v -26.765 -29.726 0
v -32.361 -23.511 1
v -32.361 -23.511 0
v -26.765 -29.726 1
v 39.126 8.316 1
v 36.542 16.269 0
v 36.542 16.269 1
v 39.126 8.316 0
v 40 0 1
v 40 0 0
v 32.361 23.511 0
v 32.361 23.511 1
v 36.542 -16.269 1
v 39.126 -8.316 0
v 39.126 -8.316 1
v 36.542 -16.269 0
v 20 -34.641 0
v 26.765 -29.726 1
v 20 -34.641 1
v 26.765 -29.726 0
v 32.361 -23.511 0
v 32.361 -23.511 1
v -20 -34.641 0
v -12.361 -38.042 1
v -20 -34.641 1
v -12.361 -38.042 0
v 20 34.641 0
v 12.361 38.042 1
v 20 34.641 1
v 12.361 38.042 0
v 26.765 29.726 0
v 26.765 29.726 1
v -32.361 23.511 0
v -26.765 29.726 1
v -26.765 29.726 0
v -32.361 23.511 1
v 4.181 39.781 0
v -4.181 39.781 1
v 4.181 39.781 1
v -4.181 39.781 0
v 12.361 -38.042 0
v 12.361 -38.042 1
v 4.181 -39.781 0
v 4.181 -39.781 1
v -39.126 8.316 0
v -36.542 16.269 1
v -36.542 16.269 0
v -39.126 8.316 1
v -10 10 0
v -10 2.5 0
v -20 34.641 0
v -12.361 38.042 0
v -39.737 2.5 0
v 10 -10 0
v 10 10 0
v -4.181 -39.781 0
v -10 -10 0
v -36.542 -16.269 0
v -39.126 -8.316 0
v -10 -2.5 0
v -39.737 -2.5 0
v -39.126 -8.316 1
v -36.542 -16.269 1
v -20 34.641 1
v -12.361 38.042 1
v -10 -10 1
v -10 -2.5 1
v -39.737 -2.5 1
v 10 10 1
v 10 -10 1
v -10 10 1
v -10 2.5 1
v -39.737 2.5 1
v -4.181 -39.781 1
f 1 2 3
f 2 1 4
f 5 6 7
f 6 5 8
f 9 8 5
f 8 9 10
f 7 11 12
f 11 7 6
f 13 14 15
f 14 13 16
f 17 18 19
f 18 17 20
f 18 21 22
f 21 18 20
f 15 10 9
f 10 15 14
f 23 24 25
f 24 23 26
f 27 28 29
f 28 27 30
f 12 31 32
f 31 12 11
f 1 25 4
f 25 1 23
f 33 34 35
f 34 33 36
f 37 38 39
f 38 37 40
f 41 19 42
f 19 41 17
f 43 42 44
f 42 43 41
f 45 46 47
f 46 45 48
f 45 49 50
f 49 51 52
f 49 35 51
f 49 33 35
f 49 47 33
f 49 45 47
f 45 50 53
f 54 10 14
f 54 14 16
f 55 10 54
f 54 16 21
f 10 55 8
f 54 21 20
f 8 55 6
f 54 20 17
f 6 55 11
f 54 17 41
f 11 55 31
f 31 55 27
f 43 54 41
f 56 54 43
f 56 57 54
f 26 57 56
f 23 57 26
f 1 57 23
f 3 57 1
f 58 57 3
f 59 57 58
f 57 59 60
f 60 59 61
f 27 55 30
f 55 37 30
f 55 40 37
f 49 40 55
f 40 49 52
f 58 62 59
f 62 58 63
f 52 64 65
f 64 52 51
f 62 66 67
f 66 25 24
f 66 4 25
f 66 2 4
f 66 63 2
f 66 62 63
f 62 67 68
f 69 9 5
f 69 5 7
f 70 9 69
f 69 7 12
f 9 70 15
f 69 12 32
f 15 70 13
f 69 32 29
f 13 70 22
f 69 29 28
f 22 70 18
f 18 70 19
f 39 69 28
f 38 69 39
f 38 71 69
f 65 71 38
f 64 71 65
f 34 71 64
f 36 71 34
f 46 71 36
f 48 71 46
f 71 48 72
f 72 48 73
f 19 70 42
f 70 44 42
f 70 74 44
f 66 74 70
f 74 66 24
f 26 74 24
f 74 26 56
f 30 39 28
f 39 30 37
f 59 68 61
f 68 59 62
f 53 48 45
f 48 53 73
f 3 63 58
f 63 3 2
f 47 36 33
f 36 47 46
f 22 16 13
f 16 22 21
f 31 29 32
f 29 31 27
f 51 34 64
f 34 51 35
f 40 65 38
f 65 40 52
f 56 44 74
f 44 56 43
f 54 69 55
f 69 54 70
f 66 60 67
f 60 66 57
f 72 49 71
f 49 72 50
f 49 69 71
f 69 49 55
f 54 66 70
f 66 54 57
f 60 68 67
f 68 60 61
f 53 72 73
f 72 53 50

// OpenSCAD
/* Uberized Simple Clothing Rack Divider */

// Inner Hole Diameter
box = 20;

// Outer Hole Diameter
outer = 80;

// Thickness
thick = 1;

// Cutout Size
cutout= 5;

difference() {
cylinder(r=outer/2, h=thick);
#translate([-box/2, -box/2 , -thick/2])
    cube([box, box, thick*2]);
#rotate(180)
#translate([0  , -cutout/2  , -thick/2])
    cube([outer, cutout, thick*2]);
}
